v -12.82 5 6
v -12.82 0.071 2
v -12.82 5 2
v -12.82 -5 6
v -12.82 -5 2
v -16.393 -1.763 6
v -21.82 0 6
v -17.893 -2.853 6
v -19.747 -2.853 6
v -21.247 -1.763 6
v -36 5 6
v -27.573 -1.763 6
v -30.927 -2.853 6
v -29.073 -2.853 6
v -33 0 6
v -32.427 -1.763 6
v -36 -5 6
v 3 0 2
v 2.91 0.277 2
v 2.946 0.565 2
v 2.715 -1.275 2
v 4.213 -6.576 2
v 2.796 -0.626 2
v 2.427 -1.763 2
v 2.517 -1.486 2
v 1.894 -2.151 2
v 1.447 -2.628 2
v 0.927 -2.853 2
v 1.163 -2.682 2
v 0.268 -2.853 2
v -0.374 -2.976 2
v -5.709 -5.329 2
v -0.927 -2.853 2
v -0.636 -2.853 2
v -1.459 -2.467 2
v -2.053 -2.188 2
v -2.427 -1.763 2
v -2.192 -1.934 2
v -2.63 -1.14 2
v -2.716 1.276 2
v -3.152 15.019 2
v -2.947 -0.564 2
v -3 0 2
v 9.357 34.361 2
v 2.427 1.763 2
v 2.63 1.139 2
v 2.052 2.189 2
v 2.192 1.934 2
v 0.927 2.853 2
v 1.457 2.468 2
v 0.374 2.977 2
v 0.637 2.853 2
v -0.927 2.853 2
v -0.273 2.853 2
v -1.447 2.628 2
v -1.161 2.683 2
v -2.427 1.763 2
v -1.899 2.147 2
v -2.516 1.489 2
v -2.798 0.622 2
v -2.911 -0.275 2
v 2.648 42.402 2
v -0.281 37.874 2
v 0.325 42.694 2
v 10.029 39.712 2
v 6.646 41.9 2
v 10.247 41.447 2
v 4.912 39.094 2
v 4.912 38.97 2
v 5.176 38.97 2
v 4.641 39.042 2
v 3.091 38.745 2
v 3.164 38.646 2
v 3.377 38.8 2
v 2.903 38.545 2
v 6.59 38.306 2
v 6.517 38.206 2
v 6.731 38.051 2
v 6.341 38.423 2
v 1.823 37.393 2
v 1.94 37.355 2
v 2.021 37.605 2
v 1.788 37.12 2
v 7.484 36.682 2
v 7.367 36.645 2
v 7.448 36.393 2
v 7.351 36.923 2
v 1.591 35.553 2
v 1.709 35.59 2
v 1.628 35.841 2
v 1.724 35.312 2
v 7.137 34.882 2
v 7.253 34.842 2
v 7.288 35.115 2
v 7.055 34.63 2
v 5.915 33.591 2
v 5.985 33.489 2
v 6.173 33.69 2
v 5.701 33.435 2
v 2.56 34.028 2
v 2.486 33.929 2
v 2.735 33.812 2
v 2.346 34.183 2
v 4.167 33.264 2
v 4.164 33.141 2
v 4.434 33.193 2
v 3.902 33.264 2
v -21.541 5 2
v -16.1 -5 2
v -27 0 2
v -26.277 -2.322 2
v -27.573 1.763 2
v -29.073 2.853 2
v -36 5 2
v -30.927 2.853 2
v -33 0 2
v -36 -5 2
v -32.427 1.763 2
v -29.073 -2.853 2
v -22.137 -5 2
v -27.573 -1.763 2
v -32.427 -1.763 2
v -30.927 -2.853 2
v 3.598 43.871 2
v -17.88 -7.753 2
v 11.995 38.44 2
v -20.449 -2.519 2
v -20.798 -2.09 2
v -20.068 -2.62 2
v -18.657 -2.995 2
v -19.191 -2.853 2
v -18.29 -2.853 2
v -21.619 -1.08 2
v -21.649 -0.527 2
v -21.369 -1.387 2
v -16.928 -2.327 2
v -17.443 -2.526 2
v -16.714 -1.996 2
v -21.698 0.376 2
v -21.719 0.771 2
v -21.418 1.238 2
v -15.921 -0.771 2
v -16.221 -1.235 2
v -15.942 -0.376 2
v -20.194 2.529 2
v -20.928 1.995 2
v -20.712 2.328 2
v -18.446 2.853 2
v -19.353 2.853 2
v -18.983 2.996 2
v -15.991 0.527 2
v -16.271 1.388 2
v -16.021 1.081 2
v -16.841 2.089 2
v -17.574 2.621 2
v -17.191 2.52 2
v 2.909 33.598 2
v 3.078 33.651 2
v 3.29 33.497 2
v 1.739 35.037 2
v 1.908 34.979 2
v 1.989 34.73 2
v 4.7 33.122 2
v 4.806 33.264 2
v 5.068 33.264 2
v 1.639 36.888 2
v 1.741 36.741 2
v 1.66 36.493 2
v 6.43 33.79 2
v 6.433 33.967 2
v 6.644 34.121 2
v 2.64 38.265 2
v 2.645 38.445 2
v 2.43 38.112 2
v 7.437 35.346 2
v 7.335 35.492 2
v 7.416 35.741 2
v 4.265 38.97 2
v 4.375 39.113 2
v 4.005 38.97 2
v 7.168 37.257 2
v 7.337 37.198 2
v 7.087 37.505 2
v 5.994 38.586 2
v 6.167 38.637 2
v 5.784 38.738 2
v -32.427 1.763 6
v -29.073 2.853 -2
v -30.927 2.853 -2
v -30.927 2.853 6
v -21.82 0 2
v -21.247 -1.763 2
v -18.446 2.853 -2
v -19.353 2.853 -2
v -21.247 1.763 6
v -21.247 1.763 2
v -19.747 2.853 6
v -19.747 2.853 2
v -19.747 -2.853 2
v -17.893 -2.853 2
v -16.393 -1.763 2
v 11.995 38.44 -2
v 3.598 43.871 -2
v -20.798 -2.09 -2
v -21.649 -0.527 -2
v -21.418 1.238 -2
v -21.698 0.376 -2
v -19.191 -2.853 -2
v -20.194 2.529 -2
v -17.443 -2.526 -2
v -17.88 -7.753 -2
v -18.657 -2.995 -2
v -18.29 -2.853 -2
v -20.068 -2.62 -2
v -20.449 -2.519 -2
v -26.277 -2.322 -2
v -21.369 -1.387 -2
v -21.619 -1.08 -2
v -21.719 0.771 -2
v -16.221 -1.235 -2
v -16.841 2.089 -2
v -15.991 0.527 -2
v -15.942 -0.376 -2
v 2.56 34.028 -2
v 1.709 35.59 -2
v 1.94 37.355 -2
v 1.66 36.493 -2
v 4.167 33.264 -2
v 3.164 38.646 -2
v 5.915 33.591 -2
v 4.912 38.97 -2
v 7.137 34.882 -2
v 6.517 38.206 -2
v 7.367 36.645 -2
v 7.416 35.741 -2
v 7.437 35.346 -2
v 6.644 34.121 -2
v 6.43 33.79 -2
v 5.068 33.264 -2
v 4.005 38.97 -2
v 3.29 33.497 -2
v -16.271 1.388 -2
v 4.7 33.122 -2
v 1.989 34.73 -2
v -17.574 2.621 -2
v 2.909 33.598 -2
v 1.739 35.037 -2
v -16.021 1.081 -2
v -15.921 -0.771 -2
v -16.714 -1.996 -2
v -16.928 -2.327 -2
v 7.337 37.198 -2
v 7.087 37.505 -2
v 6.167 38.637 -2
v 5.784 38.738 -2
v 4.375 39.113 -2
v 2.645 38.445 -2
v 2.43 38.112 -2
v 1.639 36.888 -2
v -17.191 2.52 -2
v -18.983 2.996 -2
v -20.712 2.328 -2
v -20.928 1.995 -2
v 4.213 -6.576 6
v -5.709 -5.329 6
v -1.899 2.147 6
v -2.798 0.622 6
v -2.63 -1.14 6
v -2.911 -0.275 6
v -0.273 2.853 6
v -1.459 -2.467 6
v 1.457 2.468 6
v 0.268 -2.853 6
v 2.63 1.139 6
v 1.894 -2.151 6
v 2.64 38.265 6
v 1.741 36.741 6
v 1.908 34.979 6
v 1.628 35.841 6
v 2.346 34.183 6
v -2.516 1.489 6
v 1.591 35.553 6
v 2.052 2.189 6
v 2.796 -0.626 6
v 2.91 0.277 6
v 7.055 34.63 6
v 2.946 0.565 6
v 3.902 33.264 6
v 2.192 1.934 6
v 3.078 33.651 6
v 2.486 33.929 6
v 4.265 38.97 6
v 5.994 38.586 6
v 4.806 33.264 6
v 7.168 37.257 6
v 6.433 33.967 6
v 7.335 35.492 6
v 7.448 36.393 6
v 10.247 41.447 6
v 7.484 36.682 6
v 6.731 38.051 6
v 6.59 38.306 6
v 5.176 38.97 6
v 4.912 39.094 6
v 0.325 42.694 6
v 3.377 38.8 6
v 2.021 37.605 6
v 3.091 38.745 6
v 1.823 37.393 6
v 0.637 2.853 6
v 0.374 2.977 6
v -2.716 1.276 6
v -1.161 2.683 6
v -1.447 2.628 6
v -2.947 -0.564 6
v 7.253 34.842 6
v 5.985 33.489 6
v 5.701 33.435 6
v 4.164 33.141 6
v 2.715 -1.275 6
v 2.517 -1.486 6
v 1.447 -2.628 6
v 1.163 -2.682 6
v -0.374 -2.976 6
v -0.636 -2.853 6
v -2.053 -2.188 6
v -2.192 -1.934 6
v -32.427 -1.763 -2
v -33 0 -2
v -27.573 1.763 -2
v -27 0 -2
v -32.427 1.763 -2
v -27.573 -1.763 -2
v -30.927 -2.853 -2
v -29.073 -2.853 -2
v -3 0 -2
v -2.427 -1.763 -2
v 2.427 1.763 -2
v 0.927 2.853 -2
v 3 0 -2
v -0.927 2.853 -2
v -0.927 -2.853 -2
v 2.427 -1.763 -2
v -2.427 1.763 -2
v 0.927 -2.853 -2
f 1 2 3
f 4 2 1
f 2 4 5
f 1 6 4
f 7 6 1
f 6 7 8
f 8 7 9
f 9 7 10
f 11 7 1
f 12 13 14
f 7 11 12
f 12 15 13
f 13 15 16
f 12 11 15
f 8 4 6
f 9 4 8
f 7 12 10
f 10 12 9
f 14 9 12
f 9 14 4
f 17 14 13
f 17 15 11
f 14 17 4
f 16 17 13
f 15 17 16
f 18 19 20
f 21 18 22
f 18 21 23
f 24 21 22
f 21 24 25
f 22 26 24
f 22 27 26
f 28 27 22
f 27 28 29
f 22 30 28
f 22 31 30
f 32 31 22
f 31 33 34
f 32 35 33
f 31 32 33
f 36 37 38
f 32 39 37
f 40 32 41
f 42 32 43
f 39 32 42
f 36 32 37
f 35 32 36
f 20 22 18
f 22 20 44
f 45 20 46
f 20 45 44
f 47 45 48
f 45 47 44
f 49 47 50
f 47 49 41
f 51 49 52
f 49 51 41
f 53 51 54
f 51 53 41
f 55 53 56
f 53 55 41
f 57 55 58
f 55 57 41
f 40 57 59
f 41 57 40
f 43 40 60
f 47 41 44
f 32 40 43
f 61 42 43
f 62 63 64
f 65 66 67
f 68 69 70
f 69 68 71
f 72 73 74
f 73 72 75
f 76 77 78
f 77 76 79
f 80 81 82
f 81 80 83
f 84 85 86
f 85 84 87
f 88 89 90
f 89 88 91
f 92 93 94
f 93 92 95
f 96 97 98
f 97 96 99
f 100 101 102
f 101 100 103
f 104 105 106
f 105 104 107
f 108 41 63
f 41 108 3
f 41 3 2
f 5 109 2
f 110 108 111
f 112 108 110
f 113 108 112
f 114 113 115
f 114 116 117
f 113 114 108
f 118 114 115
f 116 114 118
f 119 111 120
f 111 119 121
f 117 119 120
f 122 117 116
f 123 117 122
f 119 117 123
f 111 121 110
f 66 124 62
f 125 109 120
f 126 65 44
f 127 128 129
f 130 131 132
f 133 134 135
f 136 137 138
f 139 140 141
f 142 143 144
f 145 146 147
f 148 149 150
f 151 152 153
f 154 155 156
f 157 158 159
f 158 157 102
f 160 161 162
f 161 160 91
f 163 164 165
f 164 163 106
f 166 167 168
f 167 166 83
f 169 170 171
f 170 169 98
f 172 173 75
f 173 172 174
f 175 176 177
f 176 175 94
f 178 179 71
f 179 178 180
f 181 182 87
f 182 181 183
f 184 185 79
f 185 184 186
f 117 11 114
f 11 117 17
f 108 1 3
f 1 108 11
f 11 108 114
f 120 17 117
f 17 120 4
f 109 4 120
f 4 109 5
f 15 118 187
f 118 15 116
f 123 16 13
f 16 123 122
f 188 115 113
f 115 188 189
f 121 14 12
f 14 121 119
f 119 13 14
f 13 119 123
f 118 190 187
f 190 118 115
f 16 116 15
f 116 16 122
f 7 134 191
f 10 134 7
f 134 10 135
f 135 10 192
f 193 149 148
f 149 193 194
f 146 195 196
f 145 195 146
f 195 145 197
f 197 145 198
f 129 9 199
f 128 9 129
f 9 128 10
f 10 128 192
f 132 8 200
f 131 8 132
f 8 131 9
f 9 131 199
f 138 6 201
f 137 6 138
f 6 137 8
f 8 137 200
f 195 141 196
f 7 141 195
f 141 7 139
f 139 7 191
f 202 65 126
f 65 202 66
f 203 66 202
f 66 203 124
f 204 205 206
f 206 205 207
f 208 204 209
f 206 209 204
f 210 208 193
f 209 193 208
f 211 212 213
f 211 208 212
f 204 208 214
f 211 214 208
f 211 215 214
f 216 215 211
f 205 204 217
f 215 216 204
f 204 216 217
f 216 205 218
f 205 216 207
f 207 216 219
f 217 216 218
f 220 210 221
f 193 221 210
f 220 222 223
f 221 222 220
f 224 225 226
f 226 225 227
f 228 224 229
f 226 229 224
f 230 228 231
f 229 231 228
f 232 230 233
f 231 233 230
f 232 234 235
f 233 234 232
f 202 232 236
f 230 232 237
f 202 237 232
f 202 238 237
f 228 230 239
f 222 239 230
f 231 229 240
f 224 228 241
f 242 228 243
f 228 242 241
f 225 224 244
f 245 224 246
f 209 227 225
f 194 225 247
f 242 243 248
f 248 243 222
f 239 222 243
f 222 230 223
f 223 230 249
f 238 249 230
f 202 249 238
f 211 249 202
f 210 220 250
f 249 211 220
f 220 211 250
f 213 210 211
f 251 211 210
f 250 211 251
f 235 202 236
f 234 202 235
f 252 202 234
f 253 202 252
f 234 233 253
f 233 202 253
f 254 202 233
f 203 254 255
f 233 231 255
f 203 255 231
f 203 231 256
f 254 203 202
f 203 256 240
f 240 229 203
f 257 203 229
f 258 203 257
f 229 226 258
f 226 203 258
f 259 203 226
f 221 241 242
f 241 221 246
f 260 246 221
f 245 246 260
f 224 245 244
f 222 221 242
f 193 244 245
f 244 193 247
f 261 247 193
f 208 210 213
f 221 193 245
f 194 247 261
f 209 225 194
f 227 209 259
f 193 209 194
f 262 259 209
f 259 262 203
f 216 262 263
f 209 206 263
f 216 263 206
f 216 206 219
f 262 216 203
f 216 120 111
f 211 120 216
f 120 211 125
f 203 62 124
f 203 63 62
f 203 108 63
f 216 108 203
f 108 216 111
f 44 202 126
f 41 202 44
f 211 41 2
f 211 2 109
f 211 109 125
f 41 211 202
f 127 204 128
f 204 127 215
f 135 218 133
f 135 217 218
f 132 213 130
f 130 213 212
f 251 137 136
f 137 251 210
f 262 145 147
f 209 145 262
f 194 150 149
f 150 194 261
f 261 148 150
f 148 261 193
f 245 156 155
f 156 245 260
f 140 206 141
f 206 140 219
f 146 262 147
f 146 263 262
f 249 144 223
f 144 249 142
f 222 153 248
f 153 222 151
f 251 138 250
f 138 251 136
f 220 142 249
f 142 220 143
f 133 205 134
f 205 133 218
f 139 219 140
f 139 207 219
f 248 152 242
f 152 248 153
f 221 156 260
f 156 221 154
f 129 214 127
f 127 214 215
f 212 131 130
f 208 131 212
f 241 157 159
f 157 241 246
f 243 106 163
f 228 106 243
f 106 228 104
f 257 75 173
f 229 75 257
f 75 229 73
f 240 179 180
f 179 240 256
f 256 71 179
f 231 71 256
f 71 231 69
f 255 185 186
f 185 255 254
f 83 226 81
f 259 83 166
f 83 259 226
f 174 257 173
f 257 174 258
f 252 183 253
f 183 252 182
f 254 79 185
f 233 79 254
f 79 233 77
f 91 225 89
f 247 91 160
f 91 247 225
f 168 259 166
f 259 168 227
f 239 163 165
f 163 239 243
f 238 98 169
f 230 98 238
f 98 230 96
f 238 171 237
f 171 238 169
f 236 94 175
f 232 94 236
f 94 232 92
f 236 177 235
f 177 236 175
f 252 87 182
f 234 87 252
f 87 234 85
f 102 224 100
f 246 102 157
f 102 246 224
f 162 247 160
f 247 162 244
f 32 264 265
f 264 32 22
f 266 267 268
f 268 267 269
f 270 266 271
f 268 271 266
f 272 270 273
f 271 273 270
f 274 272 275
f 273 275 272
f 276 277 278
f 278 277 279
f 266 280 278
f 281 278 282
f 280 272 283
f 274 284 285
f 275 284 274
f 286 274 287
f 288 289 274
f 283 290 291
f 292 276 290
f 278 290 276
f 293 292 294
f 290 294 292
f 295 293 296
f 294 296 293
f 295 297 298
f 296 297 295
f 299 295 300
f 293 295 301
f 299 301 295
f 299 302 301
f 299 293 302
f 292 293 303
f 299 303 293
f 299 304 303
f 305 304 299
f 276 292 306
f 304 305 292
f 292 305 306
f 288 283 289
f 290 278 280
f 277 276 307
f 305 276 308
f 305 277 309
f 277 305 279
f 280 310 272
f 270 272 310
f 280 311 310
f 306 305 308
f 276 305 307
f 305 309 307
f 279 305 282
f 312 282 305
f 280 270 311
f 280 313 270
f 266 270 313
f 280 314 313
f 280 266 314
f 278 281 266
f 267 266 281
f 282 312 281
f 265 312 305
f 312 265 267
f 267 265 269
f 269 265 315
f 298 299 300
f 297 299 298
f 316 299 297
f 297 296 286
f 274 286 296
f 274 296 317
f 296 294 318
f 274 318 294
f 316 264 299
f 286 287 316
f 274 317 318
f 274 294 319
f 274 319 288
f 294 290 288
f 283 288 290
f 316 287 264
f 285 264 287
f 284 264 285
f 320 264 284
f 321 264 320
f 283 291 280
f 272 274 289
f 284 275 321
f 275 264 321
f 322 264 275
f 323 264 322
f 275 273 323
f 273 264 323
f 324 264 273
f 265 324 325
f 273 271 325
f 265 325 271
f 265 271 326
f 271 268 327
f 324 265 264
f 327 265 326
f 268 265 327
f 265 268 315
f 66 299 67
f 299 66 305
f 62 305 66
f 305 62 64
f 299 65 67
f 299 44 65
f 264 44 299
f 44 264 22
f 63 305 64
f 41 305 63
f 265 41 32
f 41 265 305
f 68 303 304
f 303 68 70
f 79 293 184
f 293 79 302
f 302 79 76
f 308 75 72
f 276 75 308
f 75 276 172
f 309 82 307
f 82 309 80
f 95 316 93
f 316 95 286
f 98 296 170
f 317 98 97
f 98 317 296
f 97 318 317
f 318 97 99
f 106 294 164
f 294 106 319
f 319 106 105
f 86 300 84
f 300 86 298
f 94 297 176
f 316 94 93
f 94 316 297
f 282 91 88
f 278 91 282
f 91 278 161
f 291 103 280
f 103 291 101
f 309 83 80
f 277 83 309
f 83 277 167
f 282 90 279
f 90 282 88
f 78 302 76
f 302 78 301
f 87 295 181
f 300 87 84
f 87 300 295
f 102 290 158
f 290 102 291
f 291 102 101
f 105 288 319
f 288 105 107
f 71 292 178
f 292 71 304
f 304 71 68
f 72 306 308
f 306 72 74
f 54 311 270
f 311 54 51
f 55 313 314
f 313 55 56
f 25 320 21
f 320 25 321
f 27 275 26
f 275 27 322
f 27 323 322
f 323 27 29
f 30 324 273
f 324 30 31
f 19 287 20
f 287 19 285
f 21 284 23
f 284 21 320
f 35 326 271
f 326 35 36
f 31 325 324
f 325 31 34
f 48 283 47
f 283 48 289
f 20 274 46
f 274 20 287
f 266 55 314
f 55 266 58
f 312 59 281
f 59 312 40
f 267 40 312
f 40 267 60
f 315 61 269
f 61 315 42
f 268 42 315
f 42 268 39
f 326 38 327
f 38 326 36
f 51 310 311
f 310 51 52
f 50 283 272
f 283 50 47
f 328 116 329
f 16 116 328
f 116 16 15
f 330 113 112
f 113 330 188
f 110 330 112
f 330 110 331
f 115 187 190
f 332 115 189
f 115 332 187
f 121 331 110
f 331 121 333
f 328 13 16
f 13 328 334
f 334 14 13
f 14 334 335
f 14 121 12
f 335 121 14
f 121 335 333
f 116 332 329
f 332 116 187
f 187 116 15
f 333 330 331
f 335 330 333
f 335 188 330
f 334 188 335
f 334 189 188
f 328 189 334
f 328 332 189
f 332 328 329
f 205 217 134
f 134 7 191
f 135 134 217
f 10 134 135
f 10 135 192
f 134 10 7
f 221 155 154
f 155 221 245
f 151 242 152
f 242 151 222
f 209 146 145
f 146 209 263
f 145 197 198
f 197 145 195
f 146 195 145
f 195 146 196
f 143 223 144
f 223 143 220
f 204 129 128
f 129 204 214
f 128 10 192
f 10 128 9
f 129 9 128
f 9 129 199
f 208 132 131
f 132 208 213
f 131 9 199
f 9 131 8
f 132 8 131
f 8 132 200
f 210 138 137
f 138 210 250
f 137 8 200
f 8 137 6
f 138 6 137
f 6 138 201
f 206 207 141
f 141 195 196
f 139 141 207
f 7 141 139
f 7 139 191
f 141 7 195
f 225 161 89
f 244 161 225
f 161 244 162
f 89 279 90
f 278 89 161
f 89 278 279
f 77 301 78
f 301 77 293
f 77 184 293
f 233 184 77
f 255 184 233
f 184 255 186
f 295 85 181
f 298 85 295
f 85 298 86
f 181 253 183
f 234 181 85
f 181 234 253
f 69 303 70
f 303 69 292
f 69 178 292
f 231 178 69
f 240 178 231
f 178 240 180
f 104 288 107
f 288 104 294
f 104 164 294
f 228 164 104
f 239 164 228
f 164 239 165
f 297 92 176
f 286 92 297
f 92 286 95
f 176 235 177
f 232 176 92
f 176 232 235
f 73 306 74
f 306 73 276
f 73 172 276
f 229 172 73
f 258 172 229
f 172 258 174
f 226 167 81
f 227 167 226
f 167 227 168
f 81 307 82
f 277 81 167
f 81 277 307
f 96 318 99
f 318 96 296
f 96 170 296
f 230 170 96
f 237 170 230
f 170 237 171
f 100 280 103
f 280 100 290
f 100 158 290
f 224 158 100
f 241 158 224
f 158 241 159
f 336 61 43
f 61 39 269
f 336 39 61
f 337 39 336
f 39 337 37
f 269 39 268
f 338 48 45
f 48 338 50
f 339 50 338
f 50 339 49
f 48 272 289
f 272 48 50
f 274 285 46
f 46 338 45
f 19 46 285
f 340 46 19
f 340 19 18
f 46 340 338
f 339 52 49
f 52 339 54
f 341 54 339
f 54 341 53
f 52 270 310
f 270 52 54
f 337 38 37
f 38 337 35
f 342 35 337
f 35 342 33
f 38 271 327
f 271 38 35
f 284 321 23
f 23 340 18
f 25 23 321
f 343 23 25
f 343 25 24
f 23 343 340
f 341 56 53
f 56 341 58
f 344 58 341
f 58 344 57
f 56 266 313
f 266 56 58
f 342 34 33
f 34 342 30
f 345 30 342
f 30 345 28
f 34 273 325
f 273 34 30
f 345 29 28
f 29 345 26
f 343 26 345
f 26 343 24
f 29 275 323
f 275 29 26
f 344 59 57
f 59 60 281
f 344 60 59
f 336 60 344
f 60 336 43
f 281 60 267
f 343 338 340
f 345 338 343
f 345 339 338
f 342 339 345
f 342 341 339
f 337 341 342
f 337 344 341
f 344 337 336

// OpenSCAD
// Generated by SolidPython 1.1.3 on 2025-02-27 21:29:09


union() {
	translate(v = [-36.0, -5.0, 2]) {
		rotate(a = [0, 0, -0.0]) {
			difference() {
				cube(size = [23.18, 10, 4]);
				translate(v = [6, 5.0000000000, 2.0000000000]) {
					cylinder(center = true, h = 6, r = 3.0000000000);
				}
				translate(v = [17.18, 5.0000000000, 2.0000000000]) {
					cylinder(center = true, h = 6, r = 3.0000000000);
				}
			}
		}
	}
	translate(v = [-17.88, -7.753, -2]) {
		rotate(a = [0, 0, 57.108]) {
			difference() {
				cube(size = [55.012, 10, 4]);
				translate(v = [6, 5.0000000000, 2.0000000000]) {
					cylinder(center = true, h = 6, r = 3.0000000000);
				}
				translate(v = [49.012, 5.0000000000, 2.0000000000]) {
					cylinder(center = true, h = 6, r = 3.0000000000);
				}
			}
		}
	}
	translate(v = [0.325, 42.694, 2]) {
		rotate(a = [0, 0, -97.162]) {
			difference() {
				cube(size = [48.401, 10, 4]);
				translate(v = [6, 5.0000000000, 2.0000000000]) {
					cylinder(center = true, h = 6, r = 3.0000000000);
				}
				translate(v = [42.401, 5.0000000000, 2.0000000000]) {
					cylinder(center = true, h = 6, r = 3.0000000000);
				}
			}
		}
	}
	translate(v = [-30.0000000000, 0.0000000000, 2]) {
		cylinder(center = true, h = 8, r = 3.0000000000);
	}
	translate(v = [-18.82, -0.0, 2]) {
		cylinder(center = true, h = 8, r = 3.0000000000);
	}
	translate(v = [4.538, 36.117, 2]) {
		cylinder(center = true, h = 8, r = 3.0000000000);
	}
	translate(v = [0.0000000000, 0.0000000000, 2]) {
		cylinder(center = true, h = 8, r = 3.0000000000);
	}
}
/***********************************************
*********      SolidPython code:      **********
************************************************
 
import csv
import numpy as np
import matplotlib.pyplot as plt
import matplotlib.animation as animation
import tempfile, os, io
from tinydb import Query
from mechanism import Mechanism, Joint, Link
from kinematics_simulator import KinematicsSimulator
from solid import *
from solid.utils import * 

def load_mechanism_from_db(mechanismName):
    # Lade alle Gelenke für den Mechanismus
    joints = Mechanism.find_joints_by_mechanism(mechanismName)
    #print(f"[DEBUG] Geladene Gelenke für '{mechanismName}':")
    for joint in joints:
        print(f"  - {joint}")

    # Lade alle Links für den Mechanismus
    links = Mechanism.find_links_by_mechanism(mechanismName)
    #print(f"[DEBUG] Geladene Links für '{mechanismName}':")
    for link in links:
        print(f"  - {link}")
    
    for link in links:
        if link.length is None:
            link.initialize_self_lenght()

    # Lade den gespeicherten driven_angle
    driven_angle = Mechanism.find_driven_angle_by_mechanism(mechanismName)
    #print(f"[DEBUG] Geladener driven_angle für '{mechanismName}': {driven_angle}")

    # Erzeuge und gib den Mechanismus zurück
    return Mechanism(name=mechanismName, joints=joints, links=links, angle=driven_angle)


class SimulationManager:
    _instance = None

    def __new__(cls, *args, **kwargs):
        if cls._instance is None:
            cls._instance = super(SimulationManager, cls).__new__(cls)
        return cls._instance

    def __init__(self, mechanismName:str ):
        # Statt FourBarLinkage.create_default() laden wir den Mechanismus aus der DB.
        #self.mechanism = FourBarLinkage.create_default()  # Statische Fabrikmethode, siehe unten
        self.mechanism = Mechanism.find_mech_by_name(mechanismName)
        print(f"Debug Mechanism: {self.mechanism.joints}")
        #for joint in self.mechanism.joints:
        #    print(f"Joint {joint.name}: is_fixed={joint.is_fixed}, on_circular_path={joint.on_circular_path}, initial pos=({joint.x}, {joint.y
        self.simulator = KinematicsSimulator(self.mechanism)
        print("...KinematicsSimulator erstellt!")  # Debug
        self.trajectories = {joint.name: [] for joint in self.mechanism.joints}


    def simulate_over_360(self, num_steps=36):
        """
        Berechnet die Kinematik für Winkel im Bereich von driven_angle bis driven_angle + 360°.
        Dabei werden die Trajektorien für alle Gelenke neu aufgebaut.
        """
        # Trajektorien zurücksetzen
        self.trajectories = {joint.name: [] for joint in self.mechanism.joints}

        # Starte mit dem aktuellen driven_angle als Ausgangswert
        initial_angle = self.mechanism.driven_angle
        angles = np.linspace(initial_angle, initial_angle + 2 * np.pi, num_steps)

        for theta in angles:
            self.mechanism.driven_angle = theta
            # Aktualisiere das getriebene Gelenk
            self.simulator.update_driven_joint()
            # Optimiere die freien Gelenke
            self.simulator.optimize()
            # Speichere die aktuelle Position aller Gelenke
            for joint in self.mechanism.joints:
                self.trajectories[joint.name].append((joint.x, joint.y))
            # (Optional) Debug: Überprüfe, ob sich die Positionen ändern
            # print(f"Angle: {theta:.2f}, Positions: {[ (j.name, j.x, j.y) for j in self.mechanism.joints ]}")
        #print("[DEBUG] Trajoktorieren", self.trajectories)
        return angles

    def create_animation(self):
        """
        Erzeugt eine GIF-Animation, in der in jedem Frame der aktuelle Mechanismus dargestellt wird.
        Die globalen Achsen werden dynamisch anhand aller gespeicherten Trajektorien berechnet.
        Die Animation wird in einer temporären Datei gespeichert und anschließend in einen BytesIO-Puffer geladen.
        """
        n_frames = len(next(iter(self.trajectories.values())))

        # Berechne globale Achsen-Grenzen aus allen Trajektorien
        all_x = []
        all_y = []
        for traj in self.trajectories.values():
            for (x, y) in traj:
                all_x.append(x)
                all_y.append(y)
        margin = 10  # Zusätzlicher Rand
        x_min, x_max = min(all_x) - margin, max(all_x) + margin
        y_min, y_max = min(all_y) - margin, max(all_y) + margin

        fig, ax = plt.subplots(figsize=(10, 10))

        def update(frame):
            ax.clear()
            # Zeichne für jeden Link eine Linie zwischen den verbundenen Gelenken
            for link in self.mechanism.links:
                pos_a = self.trajectories[link.joint_a.name][frame]
                pos_b = self.trajectories[link.joint_b.name][frame]
                ax.plot([pos_a[0], pos_b[0]], [pos_a[1], pos_b[1]], 'ko-', lw=2)
            # Zeichne die bisherige Trajektorie für jedes Gelenk
            for joint_name, positions in self.trajectories.items():
                xs = [p[0] for p in positions[:frame+1]]
                ys = [p[1] for p in positions[:frame+1]]
                ax.plot(xs, ys, '-', label=f"Trajectory {joint_name}")
            ax.set_xlim(x_min, x_max)
            ax.set_ylim(y_min, y_max)
            ax.set_title(f"Frame {frame+1}/{n_frames}")
            ax.legend(loc='upper right')
            ax.grid(True)

        ani = animation.FuncAnimation(fig, update, frames=n_frames, repeat=False)

        import tempfile, os, io
        with tempfile.NamedTemporaryFile(suffix=".gif", delete=False) as tmp:
            temp_filename = tmp.name
        ani.save(temp_filename, writer='pillow', fps=30)
        with open(temp_filename, "rb") as f:
            buf = io.BytesIO(f.read())
        os.remove(temp_filename)
        return buf

    def export_trajectories_to_csv(self):
        try:
            if not self.trajectories:
                return b""  # Leere Bytes statt None

            # Prüfe, ob Trajektorien vorhanden sind
            if not any(len(traj) > 0 for traj in self.trajectories.values()):
                return b""

            # Generiere CSV-Daten
            output_str = io.StringIO()
            writer = csv.writer(output_str)

            # Header
            header = ["Frame"]
            joint_names = list(self.trajectories.keys())
            for name in joint_names:
                header.extend([f"{name}_x", f"{name}_y"])
            writer.writerow(header)

            # Daten
            num_frames = len(next(iter(self.trajectories.values())))
            for i in range(num_frames):
                row = [i]
                for name in joint_names:
                    x, y = self.trajectories[name][i]
                    row.extend([float(x), float(y)])
                writer.writerow(row)

            # Konvertiere zu Bytes
            return output_str.getvalue().encode("utf-8")

        except Exception as e:
            print(f"Fehler beim CSV-Export: {e}")
            return b""  
        

    def calculate_forward_velocity(self, crank_rpm, point):
        """
        Berechnet die Vorwärtsgeschwindigkeit basierend auf der Kurbeldrehzahl
        und der gespeicherten Trajektorien-Daten.
        """
        if not self.trajectories:
            return 0.0, 0.0, 0.0  # Geschwindigkeit, Schrittlänge, Schritthöhe
        #print(f"Trajectories {self.trajectories}")
        x_positions = [pos[0] for pos in self.trajectories[point]]
        y_positions = [pos[1] for pos in self.trajectories[point]]
        #print(f"Positions for joint '{point}': x={x_positions}, y={y_positions}")

        # Berechne Schrittparameter
        step_length = 0.0
        for i in range(len(x_positions) - 1):
            temp = x_positions[i+1] - x_positions[i]
            if temp > step_length:
                step_length = temp


        # Berechne effektive Geschwindigkeit
        steps_per_revolution = len(x_positions)
        #print(f"Steps per revolution: {steps_per_revolution}")
        effective_velocity = (crank_rpm/60)/steps_per_revolution * step_length  # m/s
    
        return round(effective_velocity, 4), round(step_length, 4), steps_per_revolution
    
    def export_configuration_to_scad(self, filename):
        """
        Exportiert die Ausgangskonfiguration des Mechanismus als flache Stäbe
        mit Löchern an beiden Enden und Bolzen (als Gelenke).
        Die Links werden abwechselnd leicht in Z-Richtung versetzt, damit sie sich nicht im Weg sind.
        Dabei wird sichergestellt, dass die Bolzenlöcher exakt mit den Gelenkpositionen übereinstimmen.
        """

        components = []

        # Parameter für die flachen Links und Bolzen
        link_thickness = 4       # Dicke des flachen Stabs
        link_width = 10          # Breite des flachen Stabs
        bolt_diameter = 6        # Durchmesser der Bolzen (Gelenke)
        bolt_height = 8        # Höhe der Bolzen
        z_offset_value = 2       # Versatz in Z-Richtung für abwechselnde Positionierung

        # Links erstellen: Jeder Link wird als rechteckiger Stab mit Löchern an den Enden erzeugt.
        for i, link in enumerate(self.mechanism.links):
            # Bestimme Start- und Endpunkt (gerundet)
            start = [round(link.joint_a.x, 3), round(link.joint_a.y, 3)]
            end = [round(link.joint_b.x, 3), round(link.joint_b.y, 3)]
            dx = end[0] - start[0]
            dy = end[1] - start[1]
            actual_length = round(np.hypot(dx, dy), 3)
            # Wir erweitern um 12 Einheiten (6 an jedem Ende) für die Bolzenlöcher:
            total_length = round(actual_length + 12, 3)

            # Winkel in Bogenmaß und Grad (gerundet)
            angle_rad = np.arctan2(dy, dx)
            angle_deg = round(np.degrees(angle_rad), 3)

            # Alternierende Z-Verschiebung
            z_offset = z_offset_value if i % 2 == 0 else -z_offset_value

            # Erstelle den flachen Stab (Link) als Cube, der von 0 bis total_length in X geht.
            link_body = cube([total_length, link_width, link_thickness])

            # Löcher an beiden Enden – in der lokalen Mitte der Breite und Z-Mitte.
            # Positionen: x=6 und x=total_length-6
            hole_start = translate([6, link_width/2, link_thickness/2])(
                cylinder(r=bolt_diameter/2, h=link_thickness+2, center=True)
            )
            hole_end = translate([total_length - 6, link_width/2, link_thickness/2])(
                cylinder(r=bolt_diameter/2, h=link_thickness+2, center=True)
            )

            # Subtrahiere die Löcher vom Stab
            link_with_holes = difference()(link_body, hole_start, hole_end)

            # Damit der Bolzen am linken Ende (lokal x=6, y=link_width/2) exakt bei start liegt,
            # verschieben wir den Link zunächst um 6 Einheiten in X (lokal):
            offset_x = 6 * np.cos(angle_rad)
            offset_y = 6 * np.sin(angle_rad)
            # Zusätzlich: Versatz um link_width/2 in der lokalen Y-Richtung
            # Rotiere [0, link_width/2] in den globalen Raum:
            extra_offset_x = - np.sin(angle_rad) * (link_width/2)
            extra_offset_y =   np.cos(angle_rad) * (link_width/2)
            translation_vector = [
                round(start[0] - offset_x - extra_offset_x, 3),
                round(start[1] - offset_y - extra_offset_y, 3),
                round(z_offset, 3)
            ]

            # Drehe den Link (um angle_deg) und setze ihn an die korrekte globale Position.
            link_transformed = translate(translation_vector)(
                rotate([0, 0, angle_deg])(link_with_holes)
            )

            components.append(link_transformed)

        # Erstelle Bolzen (Gelenke) als Zylinder an den Gelenkpositionen (gerundet)
        for joint in self.mechanism.joints:
            bolt = translate([round(joint.x, 3), round(joint.y, 3), 2])(
                cylinder(r=bolt_diameter/2, h=bolt_height, center=True)
            )
            components.append(bolt)

        # Vereine alle Komponenten und exportiere das Modell
        final_model = union()(*components)
        scad_render_to_file(final_model, filename)
        print(f"Ausgangskonfiguration nach {filename} exportiert.")
 
 
************************************************/
